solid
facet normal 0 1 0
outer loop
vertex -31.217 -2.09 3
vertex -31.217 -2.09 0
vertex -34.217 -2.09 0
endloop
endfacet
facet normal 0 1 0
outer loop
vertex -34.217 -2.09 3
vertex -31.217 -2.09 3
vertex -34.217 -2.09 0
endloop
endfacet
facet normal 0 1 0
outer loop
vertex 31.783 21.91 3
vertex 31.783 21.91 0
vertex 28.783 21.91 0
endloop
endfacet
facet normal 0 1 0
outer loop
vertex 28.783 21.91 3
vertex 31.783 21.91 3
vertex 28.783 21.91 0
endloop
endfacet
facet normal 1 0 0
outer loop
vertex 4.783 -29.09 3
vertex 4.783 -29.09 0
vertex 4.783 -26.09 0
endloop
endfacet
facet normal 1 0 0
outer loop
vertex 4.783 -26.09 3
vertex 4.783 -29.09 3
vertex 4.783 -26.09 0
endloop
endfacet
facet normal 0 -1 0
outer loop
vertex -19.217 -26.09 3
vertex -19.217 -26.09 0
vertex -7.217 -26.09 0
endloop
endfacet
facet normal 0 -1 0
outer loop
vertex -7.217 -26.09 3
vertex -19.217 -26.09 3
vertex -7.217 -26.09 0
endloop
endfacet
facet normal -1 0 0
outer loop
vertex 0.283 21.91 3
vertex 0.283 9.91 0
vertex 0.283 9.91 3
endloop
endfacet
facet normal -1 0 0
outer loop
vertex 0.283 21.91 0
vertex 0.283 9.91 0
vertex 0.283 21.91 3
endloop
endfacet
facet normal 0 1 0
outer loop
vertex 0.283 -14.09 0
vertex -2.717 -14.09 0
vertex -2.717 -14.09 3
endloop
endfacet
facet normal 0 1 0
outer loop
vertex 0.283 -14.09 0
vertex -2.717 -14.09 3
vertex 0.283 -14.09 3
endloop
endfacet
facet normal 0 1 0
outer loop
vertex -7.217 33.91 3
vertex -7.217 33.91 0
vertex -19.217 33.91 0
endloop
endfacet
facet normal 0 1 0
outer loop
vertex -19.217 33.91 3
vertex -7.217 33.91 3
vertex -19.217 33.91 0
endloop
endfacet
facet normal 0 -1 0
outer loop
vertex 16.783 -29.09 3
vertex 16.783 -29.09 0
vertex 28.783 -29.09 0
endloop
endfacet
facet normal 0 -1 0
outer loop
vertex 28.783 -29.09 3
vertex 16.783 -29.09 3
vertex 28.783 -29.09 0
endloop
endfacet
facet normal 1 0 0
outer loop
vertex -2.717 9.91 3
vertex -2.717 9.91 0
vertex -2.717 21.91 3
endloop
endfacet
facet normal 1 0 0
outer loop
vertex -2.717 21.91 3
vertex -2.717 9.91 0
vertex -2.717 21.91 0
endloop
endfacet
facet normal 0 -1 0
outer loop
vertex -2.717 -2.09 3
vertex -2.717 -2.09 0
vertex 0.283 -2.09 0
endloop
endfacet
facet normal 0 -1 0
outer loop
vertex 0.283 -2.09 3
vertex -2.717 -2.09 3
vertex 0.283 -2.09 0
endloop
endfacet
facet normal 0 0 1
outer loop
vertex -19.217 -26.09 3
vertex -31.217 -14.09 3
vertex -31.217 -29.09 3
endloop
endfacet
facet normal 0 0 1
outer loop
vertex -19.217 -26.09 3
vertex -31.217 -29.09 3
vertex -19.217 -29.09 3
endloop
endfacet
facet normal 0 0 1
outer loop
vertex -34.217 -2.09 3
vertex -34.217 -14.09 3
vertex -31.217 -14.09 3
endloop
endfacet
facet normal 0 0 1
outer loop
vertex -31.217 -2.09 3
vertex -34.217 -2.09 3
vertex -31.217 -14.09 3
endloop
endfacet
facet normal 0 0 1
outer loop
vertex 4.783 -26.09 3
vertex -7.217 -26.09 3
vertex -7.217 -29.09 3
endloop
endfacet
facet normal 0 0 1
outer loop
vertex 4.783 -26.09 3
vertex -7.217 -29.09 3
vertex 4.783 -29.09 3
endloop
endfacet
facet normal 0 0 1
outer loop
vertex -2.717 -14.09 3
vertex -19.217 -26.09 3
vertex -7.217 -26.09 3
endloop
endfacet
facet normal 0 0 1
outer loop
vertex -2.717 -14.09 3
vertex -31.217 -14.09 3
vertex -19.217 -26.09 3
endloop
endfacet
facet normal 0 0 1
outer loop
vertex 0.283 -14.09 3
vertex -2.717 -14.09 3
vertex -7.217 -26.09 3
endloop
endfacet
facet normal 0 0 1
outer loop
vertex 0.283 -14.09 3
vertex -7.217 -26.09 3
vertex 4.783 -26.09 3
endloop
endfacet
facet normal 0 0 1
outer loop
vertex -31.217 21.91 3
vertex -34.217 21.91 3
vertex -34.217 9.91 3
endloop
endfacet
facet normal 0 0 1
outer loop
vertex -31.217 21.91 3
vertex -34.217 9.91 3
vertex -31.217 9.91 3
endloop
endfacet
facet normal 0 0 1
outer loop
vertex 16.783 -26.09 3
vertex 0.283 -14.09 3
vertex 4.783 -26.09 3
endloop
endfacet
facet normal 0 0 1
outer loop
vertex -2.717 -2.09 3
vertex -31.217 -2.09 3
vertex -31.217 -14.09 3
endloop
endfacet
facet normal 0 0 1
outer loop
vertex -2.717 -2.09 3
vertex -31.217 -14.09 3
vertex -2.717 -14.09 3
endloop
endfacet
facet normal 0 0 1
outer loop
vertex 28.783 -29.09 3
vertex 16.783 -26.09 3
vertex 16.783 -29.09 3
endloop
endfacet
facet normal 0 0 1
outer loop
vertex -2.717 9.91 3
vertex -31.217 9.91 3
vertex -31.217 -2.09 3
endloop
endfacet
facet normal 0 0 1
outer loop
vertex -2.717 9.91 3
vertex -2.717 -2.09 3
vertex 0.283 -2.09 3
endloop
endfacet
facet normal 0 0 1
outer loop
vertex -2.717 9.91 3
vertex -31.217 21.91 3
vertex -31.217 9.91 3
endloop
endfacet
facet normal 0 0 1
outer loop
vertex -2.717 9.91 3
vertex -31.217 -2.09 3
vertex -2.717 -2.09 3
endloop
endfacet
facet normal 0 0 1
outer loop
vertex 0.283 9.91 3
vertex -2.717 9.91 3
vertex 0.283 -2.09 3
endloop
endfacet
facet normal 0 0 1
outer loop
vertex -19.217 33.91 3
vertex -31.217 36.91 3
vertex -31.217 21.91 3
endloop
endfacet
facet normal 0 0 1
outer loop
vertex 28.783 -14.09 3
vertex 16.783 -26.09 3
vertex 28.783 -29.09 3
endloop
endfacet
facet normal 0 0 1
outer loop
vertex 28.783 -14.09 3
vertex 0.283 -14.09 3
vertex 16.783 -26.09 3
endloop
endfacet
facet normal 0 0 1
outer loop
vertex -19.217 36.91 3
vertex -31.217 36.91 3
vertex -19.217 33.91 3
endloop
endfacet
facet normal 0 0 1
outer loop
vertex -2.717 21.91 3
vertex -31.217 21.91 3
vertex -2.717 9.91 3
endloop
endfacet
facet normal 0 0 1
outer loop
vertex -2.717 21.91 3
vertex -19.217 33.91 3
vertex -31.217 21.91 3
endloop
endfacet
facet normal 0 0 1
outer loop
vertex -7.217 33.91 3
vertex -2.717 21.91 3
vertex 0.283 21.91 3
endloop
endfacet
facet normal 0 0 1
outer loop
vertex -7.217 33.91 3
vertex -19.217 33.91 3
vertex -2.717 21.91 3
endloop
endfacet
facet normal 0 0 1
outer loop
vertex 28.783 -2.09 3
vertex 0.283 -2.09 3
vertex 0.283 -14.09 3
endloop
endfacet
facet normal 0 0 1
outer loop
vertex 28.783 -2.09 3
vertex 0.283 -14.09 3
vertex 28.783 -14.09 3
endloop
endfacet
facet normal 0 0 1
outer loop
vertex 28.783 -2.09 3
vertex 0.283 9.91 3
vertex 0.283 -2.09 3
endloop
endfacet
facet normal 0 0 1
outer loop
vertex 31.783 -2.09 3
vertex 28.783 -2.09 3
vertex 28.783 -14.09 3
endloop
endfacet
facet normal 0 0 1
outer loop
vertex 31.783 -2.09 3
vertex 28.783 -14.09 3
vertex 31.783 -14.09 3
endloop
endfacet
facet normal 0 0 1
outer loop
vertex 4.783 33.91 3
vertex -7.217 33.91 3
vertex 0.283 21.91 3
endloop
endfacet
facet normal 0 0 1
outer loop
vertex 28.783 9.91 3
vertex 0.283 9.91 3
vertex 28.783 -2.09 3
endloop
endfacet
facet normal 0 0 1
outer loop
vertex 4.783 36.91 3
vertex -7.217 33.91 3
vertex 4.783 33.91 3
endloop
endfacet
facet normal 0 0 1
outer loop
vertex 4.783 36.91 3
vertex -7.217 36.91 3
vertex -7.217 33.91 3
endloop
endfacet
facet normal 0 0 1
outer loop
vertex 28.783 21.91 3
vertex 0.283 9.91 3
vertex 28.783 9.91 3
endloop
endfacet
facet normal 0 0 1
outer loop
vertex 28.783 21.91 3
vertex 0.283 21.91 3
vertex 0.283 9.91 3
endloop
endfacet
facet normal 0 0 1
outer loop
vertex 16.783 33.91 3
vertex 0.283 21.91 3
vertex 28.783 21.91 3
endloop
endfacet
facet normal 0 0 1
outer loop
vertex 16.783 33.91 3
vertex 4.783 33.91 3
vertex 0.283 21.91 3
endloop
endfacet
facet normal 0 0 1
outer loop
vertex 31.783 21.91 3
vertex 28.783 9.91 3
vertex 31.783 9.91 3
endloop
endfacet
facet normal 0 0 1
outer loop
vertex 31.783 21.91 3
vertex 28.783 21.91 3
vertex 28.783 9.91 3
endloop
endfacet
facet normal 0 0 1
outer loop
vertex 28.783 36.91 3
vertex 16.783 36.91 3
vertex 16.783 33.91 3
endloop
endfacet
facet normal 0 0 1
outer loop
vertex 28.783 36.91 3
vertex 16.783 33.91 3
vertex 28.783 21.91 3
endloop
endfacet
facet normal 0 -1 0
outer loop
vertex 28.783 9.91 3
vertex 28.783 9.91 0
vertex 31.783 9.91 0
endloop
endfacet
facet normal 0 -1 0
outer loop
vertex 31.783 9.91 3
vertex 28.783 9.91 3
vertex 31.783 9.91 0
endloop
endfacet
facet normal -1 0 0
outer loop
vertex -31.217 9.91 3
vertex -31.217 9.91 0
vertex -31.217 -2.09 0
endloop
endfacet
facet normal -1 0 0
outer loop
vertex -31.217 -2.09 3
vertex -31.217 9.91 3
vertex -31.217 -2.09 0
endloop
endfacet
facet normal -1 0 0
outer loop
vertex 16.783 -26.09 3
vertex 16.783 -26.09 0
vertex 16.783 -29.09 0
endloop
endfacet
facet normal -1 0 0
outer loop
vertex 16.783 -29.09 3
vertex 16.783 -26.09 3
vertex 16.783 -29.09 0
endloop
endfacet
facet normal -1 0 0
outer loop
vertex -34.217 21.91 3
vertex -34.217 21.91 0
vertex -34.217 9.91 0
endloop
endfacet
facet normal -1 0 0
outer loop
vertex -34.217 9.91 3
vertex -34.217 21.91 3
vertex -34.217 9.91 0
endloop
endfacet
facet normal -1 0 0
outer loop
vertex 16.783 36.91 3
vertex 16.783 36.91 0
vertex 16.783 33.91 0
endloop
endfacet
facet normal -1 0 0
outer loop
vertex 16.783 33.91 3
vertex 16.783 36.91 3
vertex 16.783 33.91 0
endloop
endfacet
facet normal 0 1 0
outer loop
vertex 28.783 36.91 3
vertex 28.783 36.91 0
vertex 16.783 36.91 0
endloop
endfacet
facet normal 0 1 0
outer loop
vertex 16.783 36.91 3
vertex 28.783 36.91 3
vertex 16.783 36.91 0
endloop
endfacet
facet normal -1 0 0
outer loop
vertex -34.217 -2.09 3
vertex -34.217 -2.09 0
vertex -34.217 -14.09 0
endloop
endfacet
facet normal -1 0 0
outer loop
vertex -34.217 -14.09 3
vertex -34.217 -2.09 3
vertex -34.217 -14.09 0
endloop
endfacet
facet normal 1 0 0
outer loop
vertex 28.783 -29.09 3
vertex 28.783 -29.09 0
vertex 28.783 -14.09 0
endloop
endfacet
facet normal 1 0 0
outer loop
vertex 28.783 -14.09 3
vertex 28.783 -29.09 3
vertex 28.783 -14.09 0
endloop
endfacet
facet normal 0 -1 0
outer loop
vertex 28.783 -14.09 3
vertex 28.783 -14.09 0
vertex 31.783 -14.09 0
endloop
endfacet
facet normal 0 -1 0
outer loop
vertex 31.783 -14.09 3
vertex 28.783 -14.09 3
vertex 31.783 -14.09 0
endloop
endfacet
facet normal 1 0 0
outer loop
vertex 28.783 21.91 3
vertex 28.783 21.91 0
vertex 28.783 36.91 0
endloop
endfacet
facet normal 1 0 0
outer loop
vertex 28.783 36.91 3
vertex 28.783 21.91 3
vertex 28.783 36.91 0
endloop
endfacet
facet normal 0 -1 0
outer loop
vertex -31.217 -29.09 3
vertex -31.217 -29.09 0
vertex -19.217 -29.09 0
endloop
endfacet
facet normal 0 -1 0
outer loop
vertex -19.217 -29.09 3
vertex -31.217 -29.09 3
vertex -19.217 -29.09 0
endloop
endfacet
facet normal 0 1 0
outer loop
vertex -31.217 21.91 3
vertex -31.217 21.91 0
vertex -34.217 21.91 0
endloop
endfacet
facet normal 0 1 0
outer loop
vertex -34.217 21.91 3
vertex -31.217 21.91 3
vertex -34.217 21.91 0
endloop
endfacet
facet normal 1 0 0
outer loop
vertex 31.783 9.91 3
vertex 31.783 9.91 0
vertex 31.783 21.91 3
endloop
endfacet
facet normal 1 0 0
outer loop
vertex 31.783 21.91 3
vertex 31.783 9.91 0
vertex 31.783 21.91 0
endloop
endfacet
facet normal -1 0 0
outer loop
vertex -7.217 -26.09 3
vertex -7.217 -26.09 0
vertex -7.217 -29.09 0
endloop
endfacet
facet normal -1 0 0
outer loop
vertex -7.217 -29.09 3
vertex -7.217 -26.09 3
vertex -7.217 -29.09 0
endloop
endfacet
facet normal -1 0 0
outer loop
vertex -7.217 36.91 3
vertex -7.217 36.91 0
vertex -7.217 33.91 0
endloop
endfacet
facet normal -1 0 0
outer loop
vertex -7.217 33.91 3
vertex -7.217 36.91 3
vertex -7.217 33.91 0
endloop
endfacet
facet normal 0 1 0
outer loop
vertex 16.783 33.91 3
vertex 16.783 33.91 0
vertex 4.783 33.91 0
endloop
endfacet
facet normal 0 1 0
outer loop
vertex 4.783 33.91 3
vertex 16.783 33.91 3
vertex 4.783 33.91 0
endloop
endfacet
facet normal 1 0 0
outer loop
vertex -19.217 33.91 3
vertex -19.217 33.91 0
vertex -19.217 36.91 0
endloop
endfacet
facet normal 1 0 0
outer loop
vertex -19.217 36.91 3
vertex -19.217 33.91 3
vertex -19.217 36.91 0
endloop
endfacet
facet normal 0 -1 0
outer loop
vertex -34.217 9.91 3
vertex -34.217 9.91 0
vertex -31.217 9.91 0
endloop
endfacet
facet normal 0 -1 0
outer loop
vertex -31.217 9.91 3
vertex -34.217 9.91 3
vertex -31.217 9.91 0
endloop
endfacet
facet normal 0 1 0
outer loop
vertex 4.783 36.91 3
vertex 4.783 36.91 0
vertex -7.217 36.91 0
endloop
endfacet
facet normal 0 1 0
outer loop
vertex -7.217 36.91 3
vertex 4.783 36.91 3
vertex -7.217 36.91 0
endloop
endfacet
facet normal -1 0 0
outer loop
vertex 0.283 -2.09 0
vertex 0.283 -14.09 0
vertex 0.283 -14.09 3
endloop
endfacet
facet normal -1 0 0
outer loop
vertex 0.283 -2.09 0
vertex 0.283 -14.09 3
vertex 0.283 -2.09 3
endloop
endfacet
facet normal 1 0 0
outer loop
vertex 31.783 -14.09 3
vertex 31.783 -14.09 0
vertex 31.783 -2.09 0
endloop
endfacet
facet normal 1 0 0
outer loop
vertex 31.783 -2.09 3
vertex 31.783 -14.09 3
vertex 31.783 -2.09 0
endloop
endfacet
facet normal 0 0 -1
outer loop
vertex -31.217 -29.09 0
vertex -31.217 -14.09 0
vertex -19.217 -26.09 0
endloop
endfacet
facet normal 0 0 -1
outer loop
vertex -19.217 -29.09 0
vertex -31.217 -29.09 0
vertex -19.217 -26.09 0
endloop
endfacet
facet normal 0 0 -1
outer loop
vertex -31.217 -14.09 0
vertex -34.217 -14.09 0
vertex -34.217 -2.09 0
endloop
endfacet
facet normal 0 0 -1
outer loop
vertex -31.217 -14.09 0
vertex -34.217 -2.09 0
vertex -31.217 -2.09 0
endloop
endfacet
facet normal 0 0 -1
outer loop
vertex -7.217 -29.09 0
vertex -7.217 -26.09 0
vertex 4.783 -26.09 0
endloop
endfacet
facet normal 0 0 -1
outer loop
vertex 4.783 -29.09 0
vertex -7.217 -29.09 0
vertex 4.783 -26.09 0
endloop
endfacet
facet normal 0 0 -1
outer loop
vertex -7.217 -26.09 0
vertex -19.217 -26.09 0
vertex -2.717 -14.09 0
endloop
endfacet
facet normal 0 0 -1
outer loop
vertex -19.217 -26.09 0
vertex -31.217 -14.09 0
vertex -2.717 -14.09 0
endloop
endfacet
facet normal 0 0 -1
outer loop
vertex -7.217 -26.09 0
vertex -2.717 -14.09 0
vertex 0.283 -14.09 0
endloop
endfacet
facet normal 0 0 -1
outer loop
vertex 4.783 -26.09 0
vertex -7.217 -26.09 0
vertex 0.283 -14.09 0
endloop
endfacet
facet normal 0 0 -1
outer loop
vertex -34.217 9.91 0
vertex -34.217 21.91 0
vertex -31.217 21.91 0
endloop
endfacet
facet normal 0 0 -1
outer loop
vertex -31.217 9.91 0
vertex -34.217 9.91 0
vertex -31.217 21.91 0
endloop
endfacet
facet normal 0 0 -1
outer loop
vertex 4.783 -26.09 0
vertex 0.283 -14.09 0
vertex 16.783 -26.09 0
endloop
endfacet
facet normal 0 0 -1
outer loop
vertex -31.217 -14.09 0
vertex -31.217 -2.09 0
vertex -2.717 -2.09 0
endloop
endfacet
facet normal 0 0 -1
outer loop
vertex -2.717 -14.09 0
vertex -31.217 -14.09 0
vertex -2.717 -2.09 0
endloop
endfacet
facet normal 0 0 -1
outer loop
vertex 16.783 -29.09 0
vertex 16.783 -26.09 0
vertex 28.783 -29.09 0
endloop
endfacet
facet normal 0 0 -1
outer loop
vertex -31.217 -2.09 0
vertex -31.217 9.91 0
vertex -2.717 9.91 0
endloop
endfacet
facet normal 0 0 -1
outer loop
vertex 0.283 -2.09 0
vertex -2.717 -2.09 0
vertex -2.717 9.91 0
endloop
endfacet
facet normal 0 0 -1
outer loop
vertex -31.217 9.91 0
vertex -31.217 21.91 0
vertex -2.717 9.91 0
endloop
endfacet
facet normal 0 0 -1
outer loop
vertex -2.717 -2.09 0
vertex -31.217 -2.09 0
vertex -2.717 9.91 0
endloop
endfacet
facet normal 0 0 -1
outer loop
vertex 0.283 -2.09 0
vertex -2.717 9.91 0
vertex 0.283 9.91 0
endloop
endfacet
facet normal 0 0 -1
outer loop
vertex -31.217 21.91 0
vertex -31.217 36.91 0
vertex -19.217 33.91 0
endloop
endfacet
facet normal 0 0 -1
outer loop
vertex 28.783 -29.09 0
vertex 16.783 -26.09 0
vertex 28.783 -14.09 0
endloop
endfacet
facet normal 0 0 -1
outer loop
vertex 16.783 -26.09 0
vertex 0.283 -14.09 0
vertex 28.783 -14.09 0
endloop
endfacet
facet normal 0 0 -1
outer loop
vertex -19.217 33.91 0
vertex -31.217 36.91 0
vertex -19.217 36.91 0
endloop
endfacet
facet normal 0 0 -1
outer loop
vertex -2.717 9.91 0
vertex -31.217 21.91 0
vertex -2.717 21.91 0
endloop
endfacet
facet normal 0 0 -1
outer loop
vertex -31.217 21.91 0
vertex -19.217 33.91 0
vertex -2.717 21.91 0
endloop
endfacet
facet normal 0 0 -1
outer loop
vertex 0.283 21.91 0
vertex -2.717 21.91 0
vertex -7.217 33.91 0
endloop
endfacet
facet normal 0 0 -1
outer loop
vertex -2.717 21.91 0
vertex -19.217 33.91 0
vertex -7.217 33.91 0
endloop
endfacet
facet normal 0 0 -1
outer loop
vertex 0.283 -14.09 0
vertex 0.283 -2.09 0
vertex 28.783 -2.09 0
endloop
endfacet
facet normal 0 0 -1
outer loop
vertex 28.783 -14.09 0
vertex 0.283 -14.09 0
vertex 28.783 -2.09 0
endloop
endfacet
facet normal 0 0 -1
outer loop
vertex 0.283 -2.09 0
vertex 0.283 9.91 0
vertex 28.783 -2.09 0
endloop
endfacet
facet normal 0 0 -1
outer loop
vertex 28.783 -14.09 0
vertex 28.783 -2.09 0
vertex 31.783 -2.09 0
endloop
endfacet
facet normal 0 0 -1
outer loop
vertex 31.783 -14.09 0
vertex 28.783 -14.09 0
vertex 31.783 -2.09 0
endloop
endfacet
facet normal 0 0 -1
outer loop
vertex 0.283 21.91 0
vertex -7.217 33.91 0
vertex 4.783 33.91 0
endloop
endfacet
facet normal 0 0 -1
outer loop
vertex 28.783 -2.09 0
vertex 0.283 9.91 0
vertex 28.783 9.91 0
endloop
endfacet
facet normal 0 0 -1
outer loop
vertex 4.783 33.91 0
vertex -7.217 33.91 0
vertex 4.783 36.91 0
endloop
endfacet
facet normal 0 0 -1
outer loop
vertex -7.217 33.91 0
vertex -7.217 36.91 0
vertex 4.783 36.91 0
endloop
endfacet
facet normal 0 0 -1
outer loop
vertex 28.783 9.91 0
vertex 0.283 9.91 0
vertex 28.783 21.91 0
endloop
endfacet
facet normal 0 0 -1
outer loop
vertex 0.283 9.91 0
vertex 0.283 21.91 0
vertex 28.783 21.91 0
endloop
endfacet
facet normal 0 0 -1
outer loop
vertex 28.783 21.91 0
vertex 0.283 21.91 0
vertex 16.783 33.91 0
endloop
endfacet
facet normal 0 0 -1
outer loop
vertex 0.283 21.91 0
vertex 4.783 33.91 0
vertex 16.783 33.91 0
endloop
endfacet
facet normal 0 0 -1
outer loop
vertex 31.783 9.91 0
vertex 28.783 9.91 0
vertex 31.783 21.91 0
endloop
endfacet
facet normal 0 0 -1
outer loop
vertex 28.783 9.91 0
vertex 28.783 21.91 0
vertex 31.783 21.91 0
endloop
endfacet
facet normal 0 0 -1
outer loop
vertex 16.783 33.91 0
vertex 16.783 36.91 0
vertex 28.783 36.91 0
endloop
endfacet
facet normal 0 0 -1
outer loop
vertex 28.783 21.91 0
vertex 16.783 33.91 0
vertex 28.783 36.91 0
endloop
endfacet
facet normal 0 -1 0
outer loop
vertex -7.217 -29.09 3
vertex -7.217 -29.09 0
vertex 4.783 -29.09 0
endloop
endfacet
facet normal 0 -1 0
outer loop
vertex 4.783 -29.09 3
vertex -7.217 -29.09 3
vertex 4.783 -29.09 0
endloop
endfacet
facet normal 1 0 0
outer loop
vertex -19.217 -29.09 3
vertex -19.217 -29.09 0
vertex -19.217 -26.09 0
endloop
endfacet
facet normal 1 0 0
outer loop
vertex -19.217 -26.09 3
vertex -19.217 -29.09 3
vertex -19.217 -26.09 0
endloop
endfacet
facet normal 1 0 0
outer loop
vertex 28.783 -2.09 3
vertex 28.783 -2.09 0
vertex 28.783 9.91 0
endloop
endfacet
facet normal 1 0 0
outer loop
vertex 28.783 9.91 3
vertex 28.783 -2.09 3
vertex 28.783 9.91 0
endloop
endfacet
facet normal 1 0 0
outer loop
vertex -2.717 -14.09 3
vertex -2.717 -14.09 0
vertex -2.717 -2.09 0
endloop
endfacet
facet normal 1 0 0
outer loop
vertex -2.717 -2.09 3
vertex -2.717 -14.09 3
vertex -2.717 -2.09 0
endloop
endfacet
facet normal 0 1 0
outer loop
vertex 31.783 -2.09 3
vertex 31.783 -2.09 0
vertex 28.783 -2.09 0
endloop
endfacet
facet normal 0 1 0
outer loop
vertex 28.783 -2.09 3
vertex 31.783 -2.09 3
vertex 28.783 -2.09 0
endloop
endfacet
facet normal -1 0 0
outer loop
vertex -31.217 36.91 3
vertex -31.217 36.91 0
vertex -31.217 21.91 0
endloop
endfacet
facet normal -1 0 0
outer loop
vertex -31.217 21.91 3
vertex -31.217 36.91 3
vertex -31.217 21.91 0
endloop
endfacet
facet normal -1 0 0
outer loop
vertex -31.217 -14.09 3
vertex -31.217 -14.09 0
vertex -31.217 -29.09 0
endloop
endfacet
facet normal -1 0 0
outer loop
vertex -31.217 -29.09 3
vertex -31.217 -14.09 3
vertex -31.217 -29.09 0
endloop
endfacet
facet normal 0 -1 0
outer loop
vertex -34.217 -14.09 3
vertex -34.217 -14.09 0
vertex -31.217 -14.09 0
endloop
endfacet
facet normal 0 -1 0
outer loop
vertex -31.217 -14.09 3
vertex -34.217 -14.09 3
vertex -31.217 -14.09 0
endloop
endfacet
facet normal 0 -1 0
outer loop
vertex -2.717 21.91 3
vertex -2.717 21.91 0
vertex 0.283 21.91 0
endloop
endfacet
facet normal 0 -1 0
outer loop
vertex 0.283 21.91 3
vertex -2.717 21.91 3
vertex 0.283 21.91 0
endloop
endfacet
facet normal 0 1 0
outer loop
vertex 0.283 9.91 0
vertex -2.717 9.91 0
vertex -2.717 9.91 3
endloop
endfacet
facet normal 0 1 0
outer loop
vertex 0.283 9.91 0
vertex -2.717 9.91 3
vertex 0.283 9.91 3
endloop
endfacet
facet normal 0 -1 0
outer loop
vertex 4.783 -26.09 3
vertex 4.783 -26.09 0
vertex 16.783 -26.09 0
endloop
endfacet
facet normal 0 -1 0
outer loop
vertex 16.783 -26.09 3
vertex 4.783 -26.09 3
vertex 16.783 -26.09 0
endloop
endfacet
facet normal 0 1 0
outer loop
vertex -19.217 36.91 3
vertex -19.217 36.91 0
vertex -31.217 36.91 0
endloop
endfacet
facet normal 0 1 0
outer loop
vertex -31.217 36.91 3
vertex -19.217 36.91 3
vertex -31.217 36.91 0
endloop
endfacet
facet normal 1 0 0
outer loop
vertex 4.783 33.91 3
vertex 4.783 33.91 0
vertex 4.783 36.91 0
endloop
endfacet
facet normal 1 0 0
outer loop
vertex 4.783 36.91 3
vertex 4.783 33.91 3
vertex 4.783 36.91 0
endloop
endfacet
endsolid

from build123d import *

# Parameters (mm, degrees)
ESBO_O1_W                = 3
ESBO_O1_H                = 12
RESSALTO_EXTRUS_O1_DEPTH = 3


with BuildPart() as part:
    # Esboço1 → Ressalto-extrusão1 (new body)
    with BuildSketch(Plane.XY):
        Polygon((-31.216896784, 9.909791424), (-31.216896784, -2.090208576), (-34.216896784, -2.090208576), (-34.216896784, -14.090208576), (-31.216896784, -14.090208576), (-31.216896784, -26.090208576), (-31.216896784, -29.090208576), (-19.216896784, -29.090208576), (-19.216896784, -26.090208576), (-7.216896784, -26.090208576), (-7.216896784, -29.090208576), (4.783103216, -29.090208576), (4.783103216, -26.090208576), (16.783103216, -26.090208576), (16.783103216, -29.090208576), (28.783103216, -29.090208576), (28.783103216, -26.090208576), (28.783103216, -14.090208576), (31.783103216, -14.090208576), (31.783103216, -2.090208576), (28.783103216, -2.090208576), (28.783103216, 9.909791424), (31.783103216, 9.909791424), (31.783103216, 21.909791424), (28.783103216, 21.909791424), (28.783103216, 33.909791424), (28.783103216, 36.909791424), (16.783103216, 36.909791424), (16.783103216, 33.909791424), (4.783103216, 33.909791424), (4.783103216, 36.909791424), (-7.216896784, 36.909791424), (-7.216896784, 33.909791424), (-19.216896784, 33.909791424), (-19.216896784, 36.909791424), (-31.216896784, 36.909791424), (-31.216896784, 33.909791424), (-31.216896784, 21.909791424), (-34.216896784, 21.909791424), (-34.216896784, 9.909791424), align=None)
        with Locations((-1.216896784, -8.090208576)):
            Rectangle(ESBO_O1_W, ESBO_O1_H, mode=Mode.SUBTRACT)
        with Locations((-1.216896784, 15.909791424)):
            Rectangle(ESBO_O1_W, ESBO_O1_H, mode=Mode.SUBTRACT)
    extrude(amount=RESSALTO_EXTRUS_O1_DEPTH)


solid = part.part
